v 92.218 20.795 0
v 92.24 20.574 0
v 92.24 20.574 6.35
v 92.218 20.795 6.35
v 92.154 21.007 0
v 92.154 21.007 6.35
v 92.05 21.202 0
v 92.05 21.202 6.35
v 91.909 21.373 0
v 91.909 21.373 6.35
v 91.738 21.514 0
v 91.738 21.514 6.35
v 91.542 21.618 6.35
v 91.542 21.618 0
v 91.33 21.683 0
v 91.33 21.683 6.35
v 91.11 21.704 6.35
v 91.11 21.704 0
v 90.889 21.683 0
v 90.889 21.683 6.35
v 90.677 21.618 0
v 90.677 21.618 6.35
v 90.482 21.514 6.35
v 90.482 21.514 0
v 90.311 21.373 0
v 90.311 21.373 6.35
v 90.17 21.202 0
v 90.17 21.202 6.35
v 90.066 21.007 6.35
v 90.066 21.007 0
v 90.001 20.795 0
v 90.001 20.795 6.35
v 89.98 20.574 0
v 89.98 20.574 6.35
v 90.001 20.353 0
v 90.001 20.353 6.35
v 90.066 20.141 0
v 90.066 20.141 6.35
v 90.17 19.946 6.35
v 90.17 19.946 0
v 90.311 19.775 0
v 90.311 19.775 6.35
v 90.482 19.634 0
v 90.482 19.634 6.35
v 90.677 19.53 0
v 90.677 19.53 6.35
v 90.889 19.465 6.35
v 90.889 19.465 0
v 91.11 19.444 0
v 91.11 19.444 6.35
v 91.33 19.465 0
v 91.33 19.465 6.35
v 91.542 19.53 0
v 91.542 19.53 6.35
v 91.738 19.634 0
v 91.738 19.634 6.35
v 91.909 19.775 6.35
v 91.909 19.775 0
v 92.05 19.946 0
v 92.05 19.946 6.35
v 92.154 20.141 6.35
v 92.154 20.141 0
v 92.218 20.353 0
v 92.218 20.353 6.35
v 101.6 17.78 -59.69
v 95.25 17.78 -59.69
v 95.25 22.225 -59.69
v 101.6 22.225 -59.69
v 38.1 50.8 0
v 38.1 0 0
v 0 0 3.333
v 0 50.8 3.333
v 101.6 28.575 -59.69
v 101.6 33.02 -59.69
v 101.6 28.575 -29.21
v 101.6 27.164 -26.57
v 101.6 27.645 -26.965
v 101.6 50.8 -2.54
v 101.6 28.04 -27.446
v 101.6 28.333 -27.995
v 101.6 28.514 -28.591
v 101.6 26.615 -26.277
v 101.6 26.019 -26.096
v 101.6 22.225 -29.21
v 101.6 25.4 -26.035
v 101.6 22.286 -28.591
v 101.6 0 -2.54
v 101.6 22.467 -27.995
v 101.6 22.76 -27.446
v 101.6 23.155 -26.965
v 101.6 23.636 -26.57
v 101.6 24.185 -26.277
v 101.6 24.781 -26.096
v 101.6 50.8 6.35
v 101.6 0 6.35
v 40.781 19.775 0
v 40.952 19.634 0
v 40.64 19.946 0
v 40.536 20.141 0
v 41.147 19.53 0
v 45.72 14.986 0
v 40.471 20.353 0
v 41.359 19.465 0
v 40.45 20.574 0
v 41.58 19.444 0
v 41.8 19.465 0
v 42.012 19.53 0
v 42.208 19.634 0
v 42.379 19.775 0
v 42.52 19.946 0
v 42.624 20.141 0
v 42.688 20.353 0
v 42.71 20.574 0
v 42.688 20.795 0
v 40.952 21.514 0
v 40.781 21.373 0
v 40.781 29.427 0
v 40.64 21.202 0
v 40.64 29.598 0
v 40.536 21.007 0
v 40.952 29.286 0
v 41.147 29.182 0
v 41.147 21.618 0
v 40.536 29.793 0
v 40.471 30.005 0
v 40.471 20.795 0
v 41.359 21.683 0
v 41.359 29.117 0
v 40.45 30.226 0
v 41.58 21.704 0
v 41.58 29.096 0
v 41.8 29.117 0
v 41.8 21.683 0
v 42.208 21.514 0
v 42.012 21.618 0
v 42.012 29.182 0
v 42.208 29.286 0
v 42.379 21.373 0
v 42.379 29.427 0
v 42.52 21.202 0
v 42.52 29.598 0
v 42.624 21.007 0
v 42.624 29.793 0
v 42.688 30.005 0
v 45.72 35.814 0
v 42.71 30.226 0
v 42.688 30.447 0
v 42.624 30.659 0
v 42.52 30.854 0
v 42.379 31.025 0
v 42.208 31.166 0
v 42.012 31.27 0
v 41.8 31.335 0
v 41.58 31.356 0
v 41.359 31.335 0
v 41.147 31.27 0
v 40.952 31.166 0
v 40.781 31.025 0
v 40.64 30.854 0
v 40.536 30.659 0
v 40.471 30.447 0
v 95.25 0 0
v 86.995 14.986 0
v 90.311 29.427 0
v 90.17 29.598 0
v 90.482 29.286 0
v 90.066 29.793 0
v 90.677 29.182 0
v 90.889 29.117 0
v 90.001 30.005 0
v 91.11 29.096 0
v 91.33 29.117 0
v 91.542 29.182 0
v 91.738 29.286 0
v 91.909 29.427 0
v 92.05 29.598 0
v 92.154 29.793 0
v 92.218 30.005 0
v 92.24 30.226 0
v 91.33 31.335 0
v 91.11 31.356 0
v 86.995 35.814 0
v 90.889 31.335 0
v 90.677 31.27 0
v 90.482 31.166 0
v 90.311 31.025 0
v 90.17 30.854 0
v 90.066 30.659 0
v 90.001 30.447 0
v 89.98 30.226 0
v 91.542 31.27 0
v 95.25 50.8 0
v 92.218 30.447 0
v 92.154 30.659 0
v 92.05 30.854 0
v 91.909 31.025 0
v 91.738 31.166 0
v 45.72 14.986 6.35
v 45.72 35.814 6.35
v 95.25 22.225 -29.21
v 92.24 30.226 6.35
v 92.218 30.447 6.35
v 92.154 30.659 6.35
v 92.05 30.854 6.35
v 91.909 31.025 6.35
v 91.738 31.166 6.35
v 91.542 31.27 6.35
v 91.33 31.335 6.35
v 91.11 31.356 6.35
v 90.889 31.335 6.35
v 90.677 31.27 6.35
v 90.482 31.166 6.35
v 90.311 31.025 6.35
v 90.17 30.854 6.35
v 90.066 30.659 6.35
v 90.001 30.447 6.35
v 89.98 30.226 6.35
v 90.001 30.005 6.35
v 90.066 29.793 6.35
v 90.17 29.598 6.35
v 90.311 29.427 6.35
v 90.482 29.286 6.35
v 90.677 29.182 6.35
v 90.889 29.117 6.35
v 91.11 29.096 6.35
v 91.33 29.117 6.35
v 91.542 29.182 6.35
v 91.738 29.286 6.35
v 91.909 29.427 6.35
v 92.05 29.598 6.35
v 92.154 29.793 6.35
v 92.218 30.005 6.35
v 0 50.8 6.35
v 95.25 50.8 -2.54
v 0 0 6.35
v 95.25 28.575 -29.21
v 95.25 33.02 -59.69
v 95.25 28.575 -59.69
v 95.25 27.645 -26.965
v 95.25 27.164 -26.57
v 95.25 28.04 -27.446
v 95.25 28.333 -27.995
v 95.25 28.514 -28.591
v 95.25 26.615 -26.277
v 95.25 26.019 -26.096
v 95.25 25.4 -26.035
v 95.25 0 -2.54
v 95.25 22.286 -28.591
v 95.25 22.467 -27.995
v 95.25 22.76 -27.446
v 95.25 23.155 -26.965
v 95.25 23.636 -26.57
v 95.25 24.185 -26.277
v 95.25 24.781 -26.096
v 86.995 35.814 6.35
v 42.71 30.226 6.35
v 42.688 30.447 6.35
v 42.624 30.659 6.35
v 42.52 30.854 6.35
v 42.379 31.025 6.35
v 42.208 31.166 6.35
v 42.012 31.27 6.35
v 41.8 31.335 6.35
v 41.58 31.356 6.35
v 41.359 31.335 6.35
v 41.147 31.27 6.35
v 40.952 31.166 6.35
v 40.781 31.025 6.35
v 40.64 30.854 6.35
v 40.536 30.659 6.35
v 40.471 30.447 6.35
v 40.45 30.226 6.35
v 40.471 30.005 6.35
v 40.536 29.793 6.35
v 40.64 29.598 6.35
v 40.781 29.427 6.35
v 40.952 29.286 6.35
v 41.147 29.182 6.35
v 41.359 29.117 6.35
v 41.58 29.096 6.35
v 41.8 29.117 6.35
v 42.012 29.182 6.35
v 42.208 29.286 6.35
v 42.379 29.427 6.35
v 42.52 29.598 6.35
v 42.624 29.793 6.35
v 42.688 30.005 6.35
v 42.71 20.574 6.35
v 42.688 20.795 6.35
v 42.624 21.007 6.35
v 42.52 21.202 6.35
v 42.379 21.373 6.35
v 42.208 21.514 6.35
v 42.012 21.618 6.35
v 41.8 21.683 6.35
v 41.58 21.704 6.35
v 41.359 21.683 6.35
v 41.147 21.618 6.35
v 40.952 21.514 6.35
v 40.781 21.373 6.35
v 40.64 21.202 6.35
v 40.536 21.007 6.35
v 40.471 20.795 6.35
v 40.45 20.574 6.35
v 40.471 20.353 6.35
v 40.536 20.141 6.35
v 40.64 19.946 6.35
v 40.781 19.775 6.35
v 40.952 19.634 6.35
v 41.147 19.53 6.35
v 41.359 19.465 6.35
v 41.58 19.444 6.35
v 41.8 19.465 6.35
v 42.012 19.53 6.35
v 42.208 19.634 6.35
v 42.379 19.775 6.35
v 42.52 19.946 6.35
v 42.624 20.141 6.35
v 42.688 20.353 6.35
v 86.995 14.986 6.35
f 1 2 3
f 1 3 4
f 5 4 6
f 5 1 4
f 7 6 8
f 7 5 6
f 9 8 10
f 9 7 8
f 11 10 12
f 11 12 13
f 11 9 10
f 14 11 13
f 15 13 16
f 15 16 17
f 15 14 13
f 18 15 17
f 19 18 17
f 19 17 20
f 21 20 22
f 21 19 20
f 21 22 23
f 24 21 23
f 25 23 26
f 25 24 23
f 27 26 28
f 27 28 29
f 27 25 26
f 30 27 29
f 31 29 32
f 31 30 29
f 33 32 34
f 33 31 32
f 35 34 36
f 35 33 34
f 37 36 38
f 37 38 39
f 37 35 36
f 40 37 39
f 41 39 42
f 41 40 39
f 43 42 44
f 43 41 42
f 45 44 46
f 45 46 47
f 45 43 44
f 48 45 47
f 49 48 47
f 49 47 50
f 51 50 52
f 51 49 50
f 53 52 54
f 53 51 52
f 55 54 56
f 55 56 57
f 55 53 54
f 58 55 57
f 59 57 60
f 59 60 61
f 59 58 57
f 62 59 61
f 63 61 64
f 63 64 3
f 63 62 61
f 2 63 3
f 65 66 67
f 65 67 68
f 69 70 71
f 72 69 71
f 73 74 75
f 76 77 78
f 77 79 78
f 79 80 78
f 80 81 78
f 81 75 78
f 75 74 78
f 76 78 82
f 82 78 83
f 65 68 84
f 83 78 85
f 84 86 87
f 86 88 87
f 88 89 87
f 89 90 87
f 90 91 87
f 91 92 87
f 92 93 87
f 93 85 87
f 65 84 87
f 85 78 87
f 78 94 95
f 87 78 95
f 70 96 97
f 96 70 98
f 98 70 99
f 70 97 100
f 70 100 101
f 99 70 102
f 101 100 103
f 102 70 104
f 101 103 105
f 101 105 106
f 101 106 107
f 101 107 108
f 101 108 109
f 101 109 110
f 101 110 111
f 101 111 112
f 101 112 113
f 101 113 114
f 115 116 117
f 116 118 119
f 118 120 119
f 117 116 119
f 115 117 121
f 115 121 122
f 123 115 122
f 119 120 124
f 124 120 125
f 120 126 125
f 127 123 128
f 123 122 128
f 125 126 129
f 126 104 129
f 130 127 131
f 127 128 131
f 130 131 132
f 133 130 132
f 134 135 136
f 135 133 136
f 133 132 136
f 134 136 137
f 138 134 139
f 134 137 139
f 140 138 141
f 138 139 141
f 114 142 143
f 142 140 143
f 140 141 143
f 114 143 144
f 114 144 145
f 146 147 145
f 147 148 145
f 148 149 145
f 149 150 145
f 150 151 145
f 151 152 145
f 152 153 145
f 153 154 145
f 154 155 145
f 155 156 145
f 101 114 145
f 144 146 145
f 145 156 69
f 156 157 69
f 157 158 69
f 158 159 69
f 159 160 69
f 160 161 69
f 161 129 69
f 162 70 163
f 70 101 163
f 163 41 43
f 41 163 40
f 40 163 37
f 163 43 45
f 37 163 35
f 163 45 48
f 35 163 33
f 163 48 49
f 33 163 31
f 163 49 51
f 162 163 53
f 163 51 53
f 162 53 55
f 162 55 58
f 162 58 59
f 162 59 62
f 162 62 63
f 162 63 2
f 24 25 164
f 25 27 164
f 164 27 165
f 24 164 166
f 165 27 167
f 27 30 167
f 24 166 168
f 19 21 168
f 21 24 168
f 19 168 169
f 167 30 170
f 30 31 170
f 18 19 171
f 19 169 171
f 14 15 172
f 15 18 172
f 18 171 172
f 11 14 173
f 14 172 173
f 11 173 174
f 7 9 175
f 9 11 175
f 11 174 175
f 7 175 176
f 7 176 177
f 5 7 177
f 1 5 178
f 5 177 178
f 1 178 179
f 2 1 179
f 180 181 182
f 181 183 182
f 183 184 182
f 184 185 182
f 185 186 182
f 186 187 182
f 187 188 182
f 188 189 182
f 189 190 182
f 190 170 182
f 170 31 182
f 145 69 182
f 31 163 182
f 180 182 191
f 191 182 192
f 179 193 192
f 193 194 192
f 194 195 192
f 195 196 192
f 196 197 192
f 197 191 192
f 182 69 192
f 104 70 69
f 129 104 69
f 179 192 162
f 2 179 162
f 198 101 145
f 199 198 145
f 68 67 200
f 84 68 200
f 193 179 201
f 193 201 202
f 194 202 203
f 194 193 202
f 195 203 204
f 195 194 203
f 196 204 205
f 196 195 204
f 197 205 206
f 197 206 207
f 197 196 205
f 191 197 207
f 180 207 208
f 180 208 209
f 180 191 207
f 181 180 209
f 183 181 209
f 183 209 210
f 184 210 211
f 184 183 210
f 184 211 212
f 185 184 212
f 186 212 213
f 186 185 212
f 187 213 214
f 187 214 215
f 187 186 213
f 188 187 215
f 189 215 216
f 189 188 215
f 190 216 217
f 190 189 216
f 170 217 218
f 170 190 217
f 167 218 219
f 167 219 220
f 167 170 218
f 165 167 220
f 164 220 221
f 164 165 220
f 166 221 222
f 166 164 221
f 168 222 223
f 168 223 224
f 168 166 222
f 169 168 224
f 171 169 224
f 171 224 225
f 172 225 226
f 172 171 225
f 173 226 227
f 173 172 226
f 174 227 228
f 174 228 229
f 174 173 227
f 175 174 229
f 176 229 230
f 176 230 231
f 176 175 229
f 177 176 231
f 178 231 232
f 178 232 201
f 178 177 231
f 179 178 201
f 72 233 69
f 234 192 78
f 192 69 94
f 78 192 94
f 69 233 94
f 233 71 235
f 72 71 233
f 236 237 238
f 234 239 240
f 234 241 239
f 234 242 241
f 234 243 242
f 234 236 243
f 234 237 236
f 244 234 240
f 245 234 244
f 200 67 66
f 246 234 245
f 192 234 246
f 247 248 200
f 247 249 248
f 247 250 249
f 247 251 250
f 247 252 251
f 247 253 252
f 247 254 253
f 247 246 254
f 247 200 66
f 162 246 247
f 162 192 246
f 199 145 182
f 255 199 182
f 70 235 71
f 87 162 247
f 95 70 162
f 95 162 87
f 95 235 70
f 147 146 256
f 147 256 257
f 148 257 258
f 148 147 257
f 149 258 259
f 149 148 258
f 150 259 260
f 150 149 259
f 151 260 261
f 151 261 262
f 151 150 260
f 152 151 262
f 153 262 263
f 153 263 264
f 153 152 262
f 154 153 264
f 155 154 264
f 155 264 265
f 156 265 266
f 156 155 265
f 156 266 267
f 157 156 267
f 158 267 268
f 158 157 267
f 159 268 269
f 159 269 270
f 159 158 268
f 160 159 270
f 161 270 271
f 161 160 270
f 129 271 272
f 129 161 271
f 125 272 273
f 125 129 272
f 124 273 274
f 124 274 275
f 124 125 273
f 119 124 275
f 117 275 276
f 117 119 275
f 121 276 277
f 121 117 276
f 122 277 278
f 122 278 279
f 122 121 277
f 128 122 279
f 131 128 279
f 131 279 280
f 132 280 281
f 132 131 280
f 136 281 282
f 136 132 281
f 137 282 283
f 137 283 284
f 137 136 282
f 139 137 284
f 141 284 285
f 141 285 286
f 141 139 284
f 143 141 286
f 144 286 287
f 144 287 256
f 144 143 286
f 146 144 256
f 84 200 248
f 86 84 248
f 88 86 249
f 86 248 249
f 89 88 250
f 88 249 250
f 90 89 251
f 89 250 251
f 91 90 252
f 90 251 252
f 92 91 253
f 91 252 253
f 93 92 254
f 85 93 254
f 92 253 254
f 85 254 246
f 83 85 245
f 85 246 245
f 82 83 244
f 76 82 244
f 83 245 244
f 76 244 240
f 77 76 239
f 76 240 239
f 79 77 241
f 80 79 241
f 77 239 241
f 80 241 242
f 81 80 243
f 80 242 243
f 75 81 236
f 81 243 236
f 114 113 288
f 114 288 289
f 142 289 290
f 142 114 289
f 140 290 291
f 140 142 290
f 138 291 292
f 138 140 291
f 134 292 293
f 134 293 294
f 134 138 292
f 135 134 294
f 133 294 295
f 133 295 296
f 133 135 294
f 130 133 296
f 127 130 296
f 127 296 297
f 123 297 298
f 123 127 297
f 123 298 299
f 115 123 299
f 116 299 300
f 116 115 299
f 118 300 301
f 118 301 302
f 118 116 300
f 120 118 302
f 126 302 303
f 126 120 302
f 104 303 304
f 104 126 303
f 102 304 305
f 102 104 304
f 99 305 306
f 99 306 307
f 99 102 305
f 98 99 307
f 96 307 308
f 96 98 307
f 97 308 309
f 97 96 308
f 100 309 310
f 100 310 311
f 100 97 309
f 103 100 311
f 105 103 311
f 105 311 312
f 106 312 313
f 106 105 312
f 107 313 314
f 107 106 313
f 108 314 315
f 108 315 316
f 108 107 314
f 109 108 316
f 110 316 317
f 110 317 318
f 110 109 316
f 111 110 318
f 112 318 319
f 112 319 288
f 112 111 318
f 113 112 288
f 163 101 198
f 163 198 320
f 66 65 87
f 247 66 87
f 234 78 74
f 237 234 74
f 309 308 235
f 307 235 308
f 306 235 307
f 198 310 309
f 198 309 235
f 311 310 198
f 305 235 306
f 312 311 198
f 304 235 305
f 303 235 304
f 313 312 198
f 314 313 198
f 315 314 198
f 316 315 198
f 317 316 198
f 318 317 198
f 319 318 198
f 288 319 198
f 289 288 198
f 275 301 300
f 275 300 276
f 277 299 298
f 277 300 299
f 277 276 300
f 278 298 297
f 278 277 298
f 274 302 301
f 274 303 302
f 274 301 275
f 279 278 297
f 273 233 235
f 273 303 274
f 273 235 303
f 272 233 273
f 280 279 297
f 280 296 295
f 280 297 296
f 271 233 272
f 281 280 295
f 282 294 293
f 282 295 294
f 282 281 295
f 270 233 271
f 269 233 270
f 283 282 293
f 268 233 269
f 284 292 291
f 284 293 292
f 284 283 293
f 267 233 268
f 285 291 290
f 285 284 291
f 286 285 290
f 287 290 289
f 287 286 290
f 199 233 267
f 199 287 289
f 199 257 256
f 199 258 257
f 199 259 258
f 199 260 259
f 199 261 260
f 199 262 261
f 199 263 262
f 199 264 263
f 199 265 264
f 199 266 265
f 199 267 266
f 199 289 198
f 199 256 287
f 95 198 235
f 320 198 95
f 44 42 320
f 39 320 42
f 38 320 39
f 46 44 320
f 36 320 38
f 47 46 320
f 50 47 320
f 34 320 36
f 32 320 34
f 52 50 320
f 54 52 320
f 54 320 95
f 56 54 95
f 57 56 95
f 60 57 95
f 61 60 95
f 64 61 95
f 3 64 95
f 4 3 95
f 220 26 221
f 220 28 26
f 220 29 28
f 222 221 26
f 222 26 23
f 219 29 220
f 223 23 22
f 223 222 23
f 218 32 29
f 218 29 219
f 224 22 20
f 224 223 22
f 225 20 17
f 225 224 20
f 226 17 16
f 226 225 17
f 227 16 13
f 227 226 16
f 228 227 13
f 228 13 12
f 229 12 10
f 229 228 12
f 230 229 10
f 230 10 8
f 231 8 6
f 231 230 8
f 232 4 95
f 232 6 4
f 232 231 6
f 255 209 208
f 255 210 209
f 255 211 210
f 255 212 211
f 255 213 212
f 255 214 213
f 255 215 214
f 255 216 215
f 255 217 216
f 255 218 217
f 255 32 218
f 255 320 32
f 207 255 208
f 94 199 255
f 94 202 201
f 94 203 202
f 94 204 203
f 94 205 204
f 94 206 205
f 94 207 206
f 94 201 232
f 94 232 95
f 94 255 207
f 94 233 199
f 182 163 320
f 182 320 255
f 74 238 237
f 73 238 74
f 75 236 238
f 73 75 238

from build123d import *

# Parameters (mm, degrees)
F0_W     = 101.6
F0_H     = 50.8
F0_R     = 1.1303
F0_W_2   = 41.275
F0_H_2   = 20.828
F1_DEPTH = 6.35
F3_DEPTH = 50.801
F4_W     = 6.35
F4_H     = 50.8
F5_DEPTH = 59.69
F7_DEPTH = 6.35
F9_DEPTH = 6.35


with BuildPart() as f1:
    # F0 (on Top) → F1 (new body)
    with BuildSketch(Plane.XY):
        with Locations((50.8, 25.4)):
            Rectangle(F0_W, F0_H)
        with Locations((41.5798, 20.574)):
            Circle(F0_R, mode=Mode.SUBTRACT)
        with Locations((66.3575, 25.4)):
            Rectangle(F0_W_2, F0_H_2, mode=Mode.SUBTRACT)
        with Locations((91.1098, 20.574)):
            Circle(F0_R, mode=Mode.SUBTRACT)
        with Locations((41.5798, 30.226)):
            Circle(F0_R, mode=Mode.SUBTRACT)
        with Locations((91.1098, 30.226)):
            Circle(F0_R, mode=Mode.SUBTRACT)
    extrude(amount=F1_DEPTH)

    # F2 (on face) → F3 (cut, through all)
    with BuildSketch(Plane.XZ):
        Polygon((0, 3.333318), (0, 0), (38.1, 0), align=None)
    extrude(amount=-F3_DEPTH, mode=Mode.SUBTRACT)

    # F4 (on face) → F5 (join)
    with BuildSketch(Plane(origin=(0, 0, 0), x_dir=(1, 0, 0), z_dir=(0, 0, -1))):
        with Locations((98.425, -25.4)):
            Rectangle(F4_W, F4_H)
    extrude(amount=F5_DEPTH)

    # F6 (on face) → F7 (cut, through all)
    with BuildSketch(Plane(origin=(95.25, 0, 0), x_dir=(0, -1, 0), z_dir=(-1, 0, 0))):
        with BuildLine():
            Line((-28.575, -29.21), (-28.575, -59.69))
            Line((-28.575, -59.69), (-22.225, -59.69))
            Line((-22.225, -59.69), (-22.225, -29.21))
            ThreePointArc((-22.225, -29.21), (-25.4, -26.035), (-28.575, -29.21))
        make_face()
    extrude(amount=-F7_DEPTH, mode=Mode.SUBTRACT)

    # F8 (on face) → F9 (cut, through all)
    with BuildSketch(Plane.YZ.offset(101.6)):
        Polygon((50.8, -59.69), (50.8, -2.54), (33.02, -59.69), align=None)
        Polygon((0, -2.54), (0, -59.69), (17.78, -59.69), align=None)
    extrude(amount=-F9_DEPTH, mode=Mode.SUBTRACT)


solid = f1.part
